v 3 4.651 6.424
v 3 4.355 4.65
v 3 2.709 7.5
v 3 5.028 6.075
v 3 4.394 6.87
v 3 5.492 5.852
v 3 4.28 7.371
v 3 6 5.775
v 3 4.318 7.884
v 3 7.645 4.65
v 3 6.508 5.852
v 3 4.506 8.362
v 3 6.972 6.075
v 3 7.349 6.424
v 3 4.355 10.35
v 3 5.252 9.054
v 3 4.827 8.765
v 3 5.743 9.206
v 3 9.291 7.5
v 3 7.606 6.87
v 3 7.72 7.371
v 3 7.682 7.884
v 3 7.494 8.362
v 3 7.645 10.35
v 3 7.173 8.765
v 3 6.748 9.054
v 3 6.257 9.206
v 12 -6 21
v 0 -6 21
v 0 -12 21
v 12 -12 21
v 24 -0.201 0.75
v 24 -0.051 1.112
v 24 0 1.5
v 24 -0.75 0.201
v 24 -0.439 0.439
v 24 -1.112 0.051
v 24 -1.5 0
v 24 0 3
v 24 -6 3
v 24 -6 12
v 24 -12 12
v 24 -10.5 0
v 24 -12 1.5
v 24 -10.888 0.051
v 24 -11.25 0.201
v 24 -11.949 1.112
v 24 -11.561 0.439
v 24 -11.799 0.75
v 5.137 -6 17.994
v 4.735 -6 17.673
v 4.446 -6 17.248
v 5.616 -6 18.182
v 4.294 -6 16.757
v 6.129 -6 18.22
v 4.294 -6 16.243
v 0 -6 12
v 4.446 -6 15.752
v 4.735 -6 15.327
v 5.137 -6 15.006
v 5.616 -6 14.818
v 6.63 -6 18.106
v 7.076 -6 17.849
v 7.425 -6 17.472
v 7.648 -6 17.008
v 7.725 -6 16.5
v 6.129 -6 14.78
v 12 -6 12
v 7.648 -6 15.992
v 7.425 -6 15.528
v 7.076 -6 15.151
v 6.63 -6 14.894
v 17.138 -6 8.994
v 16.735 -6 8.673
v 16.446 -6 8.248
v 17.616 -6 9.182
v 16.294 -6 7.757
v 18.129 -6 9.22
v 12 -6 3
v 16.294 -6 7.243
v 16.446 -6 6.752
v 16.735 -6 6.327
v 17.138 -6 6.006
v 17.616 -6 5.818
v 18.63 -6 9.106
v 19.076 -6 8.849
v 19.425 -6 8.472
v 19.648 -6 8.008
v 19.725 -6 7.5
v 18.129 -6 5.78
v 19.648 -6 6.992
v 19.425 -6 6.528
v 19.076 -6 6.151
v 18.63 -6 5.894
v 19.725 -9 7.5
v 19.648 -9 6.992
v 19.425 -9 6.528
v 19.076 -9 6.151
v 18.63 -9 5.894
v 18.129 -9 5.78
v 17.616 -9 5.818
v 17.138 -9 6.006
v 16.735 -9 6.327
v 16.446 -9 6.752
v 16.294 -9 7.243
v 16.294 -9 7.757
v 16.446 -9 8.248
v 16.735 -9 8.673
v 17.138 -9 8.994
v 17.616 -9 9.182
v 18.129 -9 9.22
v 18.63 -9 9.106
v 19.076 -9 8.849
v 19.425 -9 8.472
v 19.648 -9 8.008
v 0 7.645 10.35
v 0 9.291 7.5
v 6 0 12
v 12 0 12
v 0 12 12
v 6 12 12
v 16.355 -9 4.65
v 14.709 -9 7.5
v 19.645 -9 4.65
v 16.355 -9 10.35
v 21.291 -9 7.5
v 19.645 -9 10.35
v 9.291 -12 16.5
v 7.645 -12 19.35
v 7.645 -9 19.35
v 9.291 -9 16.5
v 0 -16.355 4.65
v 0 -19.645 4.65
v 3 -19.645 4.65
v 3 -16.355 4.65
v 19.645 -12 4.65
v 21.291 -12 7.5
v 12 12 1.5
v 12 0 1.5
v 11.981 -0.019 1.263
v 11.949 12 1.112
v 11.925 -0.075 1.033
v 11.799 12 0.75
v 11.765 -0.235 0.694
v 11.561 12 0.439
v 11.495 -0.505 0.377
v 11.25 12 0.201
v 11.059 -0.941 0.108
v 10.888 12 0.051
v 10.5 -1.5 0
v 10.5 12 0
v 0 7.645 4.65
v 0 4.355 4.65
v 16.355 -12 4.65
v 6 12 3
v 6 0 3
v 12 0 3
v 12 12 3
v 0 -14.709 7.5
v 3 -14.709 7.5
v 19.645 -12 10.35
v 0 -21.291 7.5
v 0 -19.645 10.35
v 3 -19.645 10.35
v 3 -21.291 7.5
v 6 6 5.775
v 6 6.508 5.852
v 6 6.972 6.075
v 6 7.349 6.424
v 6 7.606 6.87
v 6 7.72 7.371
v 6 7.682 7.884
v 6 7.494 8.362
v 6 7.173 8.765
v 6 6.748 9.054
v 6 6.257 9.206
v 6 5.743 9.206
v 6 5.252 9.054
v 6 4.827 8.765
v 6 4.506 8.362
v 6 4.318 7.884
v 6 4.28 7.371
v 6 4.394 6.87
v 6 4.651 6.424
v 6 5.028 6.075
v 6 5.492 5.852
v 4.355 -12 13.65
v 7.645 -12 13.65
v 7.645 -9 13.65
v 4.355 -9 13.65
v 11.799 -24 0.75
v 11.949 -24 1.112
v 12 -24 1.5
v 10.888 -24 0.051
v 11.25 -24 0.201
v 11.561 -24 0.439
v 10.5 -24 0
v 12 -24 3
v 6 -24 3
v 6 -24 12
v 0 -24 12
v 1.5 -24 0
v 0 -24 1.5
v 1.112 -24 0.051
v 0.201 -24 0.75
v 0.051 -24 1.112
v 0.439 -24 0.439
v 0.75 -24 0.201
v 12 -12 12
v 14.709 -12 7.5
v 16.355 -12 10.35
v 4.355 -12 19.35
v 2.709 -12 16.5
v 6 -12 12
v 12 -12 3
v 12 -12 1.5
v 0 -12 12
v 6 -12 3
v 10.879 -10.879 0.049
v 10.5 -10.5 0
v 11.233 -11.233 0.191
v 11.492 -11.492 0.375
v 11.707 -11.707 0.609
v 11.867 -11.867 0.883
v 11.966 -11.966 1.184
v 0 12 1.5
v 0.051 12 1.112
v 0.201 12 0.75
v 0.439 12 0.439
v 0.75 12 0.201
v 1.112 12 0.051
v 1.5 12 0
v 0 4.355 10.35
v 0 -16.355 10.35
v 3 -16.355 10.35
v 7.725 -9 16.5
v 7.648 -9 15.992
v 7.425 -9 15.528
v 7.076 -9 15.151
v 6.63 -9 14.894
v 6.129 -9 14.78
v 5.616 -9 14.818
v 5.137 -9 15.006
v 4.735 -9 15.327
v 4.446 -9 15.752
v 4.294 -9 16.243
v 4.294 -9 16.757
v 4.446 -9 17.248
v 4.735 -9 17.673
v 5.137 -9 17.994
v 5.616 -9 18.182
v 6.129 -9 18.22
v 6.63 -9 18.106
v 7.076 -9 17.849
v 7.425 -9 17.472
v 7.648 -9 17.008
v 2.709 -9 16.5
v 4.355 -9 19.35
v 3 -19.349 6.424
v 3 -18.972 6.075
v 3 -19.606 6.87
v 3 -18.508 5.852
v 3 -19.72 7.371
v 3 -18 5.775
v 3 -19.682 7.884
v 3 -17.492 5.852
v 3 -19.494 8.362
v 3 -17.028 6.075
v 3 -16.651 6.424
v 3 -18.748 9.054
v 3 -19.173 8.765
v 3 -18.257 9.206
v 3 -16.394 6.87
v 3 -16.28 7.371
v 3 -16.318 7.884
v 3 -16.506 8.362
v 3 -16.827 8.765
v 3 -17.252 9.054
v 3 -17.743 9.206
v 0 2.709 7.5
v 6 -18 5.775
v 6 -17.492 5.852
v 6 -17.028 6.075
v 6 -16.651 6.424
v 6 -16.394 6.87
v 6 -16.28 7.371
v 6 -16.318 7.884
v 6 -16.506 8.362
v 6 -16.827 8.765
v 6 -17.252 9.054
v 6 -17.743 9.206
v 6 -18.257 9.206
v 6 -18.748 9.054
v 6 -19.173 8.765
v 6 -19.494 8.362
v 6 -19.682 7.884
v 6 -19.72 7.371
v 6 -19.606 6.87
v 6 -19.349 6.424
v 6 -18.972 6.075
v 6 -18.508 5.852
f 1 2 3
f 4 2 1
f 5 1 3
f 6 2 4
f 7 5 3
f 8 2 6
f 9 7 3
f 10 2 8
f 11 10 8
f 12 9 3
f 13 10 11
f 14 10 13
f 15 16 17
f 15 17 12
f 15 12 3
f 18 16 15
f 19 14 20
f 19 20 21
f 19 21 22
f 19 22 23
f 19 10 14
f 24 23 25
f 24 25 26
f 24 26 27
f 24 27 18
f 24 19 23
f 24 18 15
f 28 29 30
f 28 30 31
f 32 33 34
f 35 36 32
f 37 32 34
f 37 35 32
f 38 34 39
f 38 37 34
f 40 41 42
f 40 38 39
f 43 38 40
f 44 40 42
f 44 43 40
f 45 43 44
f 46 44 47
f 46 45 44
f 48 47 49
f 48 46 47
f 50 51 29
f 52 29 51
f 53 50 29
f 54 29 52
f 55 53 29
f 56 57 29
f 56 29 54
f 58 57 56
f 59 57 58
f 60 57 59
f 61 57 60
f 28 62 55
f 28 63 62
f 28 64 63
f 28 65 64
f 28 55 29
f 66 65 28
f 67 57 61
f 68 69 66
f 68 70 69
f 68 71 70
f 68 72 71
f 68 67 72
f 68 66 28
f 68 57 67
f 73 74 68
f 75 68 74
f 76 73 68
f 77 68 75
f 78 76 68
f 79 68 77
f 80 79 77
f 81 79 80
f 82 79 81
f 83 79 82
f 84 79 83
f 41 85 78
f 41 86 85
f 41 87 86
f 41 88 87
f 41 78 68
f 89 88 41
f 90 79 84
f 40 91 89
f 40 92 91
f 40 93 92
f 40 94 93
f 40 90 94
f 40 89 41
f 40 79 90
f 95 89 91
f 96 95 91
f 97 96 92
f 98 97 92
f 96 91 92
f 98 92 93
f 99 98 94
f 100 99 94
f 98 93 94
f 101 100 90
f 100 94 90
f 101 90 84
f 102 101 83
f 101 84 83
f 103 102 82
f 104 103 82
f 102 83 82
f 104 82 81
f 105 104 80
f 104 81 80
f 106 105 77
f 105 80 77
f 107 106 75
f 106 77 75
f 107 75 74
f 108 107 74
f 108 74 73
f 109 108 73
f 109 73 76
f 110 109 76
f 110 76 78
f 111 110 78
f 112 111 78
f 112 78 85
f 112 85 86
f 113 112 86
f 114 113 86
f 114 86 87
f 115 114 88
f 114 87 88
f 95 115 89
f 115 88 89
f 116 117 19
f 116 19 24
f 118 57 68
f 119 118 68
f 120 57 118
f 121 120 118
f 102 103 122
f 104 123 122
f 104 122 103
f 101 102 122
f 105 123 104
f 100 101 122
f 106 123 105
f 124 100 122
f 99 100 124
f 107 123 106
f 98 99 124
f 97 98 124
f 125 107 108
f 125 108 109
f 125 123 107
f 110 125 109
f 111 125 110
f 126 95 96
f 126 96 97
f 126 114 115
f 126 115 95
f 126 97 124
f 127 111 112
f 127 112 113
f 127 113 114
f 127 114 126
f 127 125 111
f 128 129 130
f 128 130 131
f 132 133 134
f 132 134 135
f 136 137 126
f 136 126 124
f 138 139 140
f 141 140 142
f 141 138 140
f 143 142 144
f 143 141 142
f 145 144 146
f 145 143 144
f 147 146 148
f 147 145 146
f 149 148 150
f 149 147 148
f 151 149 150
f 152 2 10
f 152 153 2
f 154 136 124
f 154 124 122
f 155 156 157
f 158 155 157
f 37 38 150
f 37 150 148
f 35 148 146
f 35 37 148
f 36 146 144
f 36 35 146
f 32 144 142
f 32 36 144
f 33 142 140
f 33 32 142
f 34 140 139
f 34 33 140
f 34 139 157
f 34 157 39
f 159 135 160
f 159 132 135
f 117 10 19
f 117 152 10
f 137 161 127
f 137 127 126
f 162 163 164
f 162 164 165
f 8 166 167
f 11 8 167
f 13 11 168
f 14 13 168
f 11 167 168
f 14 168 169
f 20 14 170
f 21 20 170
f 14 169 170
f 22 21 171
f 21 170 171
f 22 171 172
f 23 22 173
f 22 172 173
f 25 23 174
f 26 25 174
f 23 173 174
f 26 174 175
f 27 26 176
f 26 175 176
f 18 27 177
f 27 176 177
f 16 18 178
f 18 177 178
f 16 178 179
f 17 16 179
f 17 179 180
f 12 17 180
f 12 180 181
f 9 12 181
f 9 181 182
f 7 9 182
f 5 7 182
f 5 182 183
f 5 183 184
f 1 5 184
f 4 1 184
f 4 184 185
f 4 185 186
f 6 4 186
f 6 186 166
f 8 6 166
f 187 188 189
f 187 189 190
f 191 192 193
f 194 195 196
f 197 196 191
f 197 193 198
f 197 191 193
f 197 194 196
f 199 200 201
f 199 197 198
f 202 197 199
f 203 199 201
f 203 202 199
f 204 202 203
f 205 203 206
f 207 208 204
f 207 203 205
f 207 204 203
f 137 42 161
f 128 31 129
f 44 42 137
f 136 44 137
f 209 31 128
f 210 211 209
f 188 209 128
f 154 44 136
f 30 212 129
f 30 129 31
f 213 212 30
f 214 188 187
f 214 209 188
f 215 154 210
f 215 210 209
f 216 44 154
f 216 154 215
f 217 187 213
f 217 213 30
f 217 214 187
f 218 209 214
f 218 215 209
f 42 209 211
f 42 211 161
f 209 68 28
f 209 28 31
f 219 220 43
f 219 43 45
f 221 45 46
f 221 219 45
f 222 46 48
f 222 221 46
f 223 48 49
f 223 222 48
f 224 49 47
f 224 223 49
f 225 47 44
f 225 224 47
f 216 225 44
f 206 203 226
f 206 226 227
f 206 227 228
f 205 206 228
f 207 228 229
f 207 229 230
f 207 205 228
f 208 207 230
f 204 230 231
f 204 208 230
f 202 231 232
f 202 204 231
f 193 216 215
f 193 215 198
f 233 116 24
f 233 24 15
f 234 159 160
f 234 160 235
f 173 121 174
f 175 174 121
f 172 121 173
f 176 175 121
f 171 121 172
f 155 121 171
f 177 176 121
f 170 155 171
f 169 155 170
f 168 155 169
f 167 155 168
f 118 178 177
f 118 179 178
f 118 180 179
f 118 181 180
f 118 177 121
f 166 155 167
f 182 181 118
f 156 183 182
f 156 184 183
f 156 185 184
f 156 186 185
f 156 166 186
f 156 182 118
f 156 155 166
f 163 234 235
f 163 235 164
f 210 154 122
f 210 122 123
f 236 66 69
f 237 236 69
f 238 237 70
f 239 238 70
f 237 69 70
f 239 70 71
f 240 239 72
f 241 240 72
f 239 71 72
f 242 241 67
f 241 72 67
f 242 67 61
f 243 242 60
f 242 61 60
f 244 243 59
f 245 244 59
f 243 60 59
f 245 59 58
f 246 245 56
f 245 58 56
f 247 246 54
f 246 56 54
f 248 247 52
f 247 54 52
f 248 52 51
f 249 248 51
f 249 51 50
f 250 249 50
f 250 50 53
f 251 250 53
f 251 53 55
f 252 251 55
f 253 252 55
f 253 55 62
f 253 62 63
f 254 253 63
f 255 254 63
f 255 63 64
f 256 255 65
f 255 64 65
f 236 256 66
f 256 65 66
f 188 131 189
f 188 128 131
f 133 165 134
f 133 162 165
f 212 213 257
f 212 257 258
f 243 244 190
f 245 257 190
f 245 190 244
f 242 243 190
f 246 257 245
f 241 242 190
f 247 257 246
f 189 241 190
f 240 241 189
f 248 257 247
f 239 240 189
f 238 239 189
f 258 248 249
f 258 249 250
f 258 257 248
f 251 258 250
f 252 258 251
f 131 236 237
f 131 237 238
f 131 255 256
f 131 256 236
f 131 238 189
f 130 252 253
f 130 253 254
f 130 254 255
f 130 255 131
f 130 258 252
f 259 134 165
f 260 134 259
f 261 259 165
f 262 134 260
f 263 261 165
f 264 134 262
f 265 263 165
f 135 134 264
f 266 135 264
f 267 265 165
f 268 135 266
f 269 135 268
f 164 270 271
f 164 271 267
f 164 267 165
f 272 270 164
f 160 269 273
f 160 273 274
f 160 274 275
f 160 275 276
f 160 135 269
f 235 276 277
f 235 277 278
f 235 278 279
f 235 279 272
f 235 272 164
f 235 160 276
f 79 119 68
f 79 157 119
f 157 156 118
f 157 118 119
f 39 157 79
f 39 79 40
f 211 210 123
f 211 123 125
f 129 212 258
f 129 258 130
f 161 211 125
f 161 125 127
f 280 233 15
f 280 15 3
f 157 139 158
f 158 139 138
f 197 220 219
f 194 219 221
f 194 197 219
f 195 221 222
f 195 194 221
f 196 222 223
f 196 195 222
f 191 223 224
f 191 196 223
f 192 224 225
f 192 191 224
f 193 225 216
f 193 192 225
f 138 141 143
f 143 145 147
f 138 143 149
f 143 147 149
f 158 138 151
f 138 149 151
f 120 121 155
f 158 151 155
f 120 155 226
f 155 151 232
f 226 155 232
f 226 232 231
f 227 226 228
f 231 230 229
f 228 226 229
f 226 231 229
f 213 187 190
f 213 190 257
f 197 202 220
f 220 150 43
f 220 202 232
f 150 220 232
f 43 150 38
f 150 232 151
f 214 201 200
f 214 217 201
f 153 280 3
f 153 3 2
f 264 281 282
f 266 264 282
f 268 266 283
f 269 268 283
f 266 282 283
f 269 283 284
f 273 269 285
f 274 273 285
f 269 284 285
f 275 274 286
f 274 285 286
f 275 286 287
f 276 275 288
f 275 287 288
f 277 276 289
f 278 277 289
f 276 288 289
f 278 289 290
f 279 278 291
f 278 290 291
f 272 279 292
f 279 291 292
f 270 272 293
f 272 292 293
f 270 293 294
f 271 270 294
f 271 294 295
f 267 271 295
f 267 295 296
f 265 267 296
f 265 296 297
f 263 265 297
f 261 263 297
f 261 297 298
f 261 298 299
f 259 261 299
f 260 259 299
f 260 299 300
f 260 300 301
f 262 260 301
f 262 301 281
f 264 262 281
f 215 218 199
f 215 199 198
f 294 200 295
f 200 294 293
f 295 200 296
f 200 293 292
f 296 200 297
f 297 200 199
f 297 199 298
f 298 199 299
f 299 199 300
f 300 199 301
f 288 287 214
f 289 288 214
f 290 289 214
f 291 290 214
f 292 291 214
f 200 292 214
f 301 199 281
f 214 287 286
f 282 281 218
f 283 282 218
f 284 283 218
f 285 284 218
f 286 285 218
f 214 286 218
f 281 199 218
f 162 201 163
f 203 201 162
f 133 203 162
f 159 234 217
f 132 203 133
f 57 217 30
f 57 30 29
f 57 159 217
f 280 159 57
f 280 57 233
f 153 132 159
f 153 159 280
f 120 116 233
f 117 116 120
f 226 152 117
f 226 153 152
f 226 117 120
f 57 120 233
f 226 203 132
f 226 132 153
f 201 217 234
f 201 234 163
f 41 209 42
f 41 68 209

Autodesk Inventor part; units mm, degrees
ref_plane "YZ Plane" through (0, 0, 0) normal (1, 0, 0) x (0, 1, 0)
ref_plane "XZ Plane" through (0, 0, 0) normal (0, 1, 0) x (-1, 0, 0)
ref_plane "XY Plane" through (0, 0, 0) normal (0, 0, 1) x (1, 0, 0)
sketch "Sketch1" plane through (0, 0, 0) normal (0, 0, 1) x (1, 0, 0)
  line L0 (0, 0) -> (12, 0)
  line L1 (12, 0) -> (12, 12)
  line L2 (12, 12) -> (0, 12)
  line L3 (0, 12) -> (0, 0)
  line L4 (12, 0) -> (0, 0)
  line L5 (0, 0) -> (0, -12)
  line L6 (0, -12) -> (12, -12)
  line L7 (12, -12) -> (12, 0)
  line L8 (12, 0) -> (24, 0)
  line L9 (24, 0) -> (24, -12)
  line L10 (24, -12) -> (12, -12)
  line L11 (12, -12) -> (12, 0)
  line L12 (0, -12) -> (-12, -12)
  line L13 (-12, -12) -> (-12, 0)
  line L14 (-12, 0) -> (0, 0)
  line L15 (0, 0) -> (0, -12)
  line L16 (0, -12) -> (12, -12)
  line L17 (12, -12) -> (12, -24)
  line L18 (12, -24) -> (0, -24)
  line L19 (0, -24) -> (0, -12)
  dimension "d0" = 12
  dimension "d1" = 12
  dimension "d2" = 12
  dimension "d3" = 12
  dimension "d4" = 12
  dimension "d5" = 12
  dimension "d6" = 12
  dimension "d7" = 12
  dimension "d8" = 12
  dimension "d9" = 12
extrude "Extrusion1" add sketch "Sketch1" along normal blind 3
sketch "Sketch2" plane through (0, 0, 3) normal (0, 0, 1) x (1, 0, 0)
  line L0 (-12, 0) -> (-12, -12) projected
  line L1 (-12, -12) -> (-12, -6)
  line L2 (-12, -6) -> (0, -6)
  line L3 (-12, -12) -> (0, -12) projected
  line L4 (0, -6) -> (0, -12)
  line L5 (0, -12) -> (-12, -12)
  line L6 (12, -24) -> (12, -12) projected
  line L7 (12, -12) -> (12, -6)
  line L8 (12, -6) -> (24, -6)
  line L9 (24, -12) -> (24, 0) projected
  line L10 (12, -12) -> (24, -12) projected
  line L11 (24, -6) -> (24, -12)
  line L12 (24, -12) -> (12, -12)
  line L13 (0, 0) -> (0, -6)
  line L14 (12, 0) -> (12, 12) projected
  line L15 (0, 0) -> (12, 0)
  line L16 (12, 0) -> (12, -6)
  line L17 (12, -12) -> (0, -12)
  line L18 (0, 12) -> (0, 0) projected
  line L19 (0, 0) -> (0, 12)
  line L20 (0, 12) -> (6, 12)
  line L21 (12, 12) -> (0, 12) projected
  line L22 (6, 12) -> (6, 0)
  line L23 (6, 0) -> (0, 0)
  line L24 (0, -12) -> (0, -24) projected
  line L25 (0, -12) -> (0, -24)
  line L26 (0, -24) -> (6, -24)
  line L27 (0, -24) -> (12, -24) projected
  line L28 (6, -24) -> (6, -12)
  line L29 (6, -12) -> (0, -12)
  dimension "d12" = 6
  dimension "d13" = 12
extrude "Extrusion2" add sketch "Sketch2" along normal blind 9 contours L2 L4 L3 L0 | L13 L15 L16 L7 L17 L4 | L17 L28 L26 L24 | L18 L20 L22 L15 | L7 L8 L9 L10
sketch "Sketch3" plane through (0, 0, 12) normal (0, 0, 1) x (1, 0, 0)
  line L0 (0, -6) -> (12, -6)
  line L1 (12, -12) -> (6, -12) projected
  line L2 (12, -6) -> (12, -12)
  line L3 (0, -12) -> (0, -24) projected
  line L4 (12, -12) -> (0, -12)
  line L5 (0, -12) -> (0, -6)
  point P0 (0, 0)
extrude "Extrusion3" add sketch "Sketch3" along normal blind 9
sketch "Sketch4" plane through (6, -12, 3) normal (0, -1, 0) x (1, 0, 0)
  point P0 (-6, -3)
sketch "Sketch5" plane through (-12, -6, 3) normal (0, 1, 0) x (1, 0, 0)
  circle A0 centre (6, -4.5) radius 1.725
  line L0 (0, 0) -> (0, -9) projected
  line L1 (12, -9) -> (0, -9) projected
  circle A1 centre (18, -13.5) radius 1.725
  line L2 (24, -18) -> (12, -18) projected
  line L3 (24, -9) -> (24, -18) projected
  circle A2 centre (30, -4.5) radius 1.725
  line L4 (36, 0) -> (36, -9) projected
  line L5 (36, -9) -> (24, -9) projected
  point P0 (12, 3)
  dimension "d19" = 3.45
  dimension "d20" = 6
  dimension "d21" = 4.5
  dimension "d22" = 3.45
  dimension "d23" = 4.5
  dimension "d24" = 6
  dimension "d25" = 3.45
  dimension "d26" = 6
  dimension "d27" = 4.5
extrude "Extrusion4" cut sketch "Sketch5" against normal blind 3
sketch "Sketch6" plane through (6, -12, 3) normal (0, -1, 0) x (1, 0, 0)
  circle A0 centre (-12, 4.5) radius 1.725 projected
  line L0 (-10.3546, 7.35) -> (-8.7091, 4.5)
  line L1 (-8.7091, 4.5) -> (-10.3546, 1.65)
  line L2 (-10.3546, 1.65) -> (-13.6454, 1.65)
  line L3 (-13.6454, 1.65) -> (-15.2909, 4.5)
  line L4 (-15.2909, 4.5) -> (-13.6454, 7.35)
  line L5 (-13.6454, 7.35) -> (-10.3546, 7.35)
  circle A1 centre (12, 4.5) radius 1.725 projected
  line L6 (13.6454, 7.35) -> (15.2909, 4.5)
  line L7 (15.2909, 4.5) -> (13.6454, 1.65)
  line L8 (13.6454, 1.65) -> (10.3546, 1.65)
  line L9 (10.3546, 1.65) -> (8.7091, 4.5)
  line L10 (8.7091, 4.5) -> (10.3546, 7.35)
  line L11 (10.3546, 7.35) -> (13.6454, 7.35)
  circle A2 centre (0, 13.5) radius 1.725 projected
  line L12 (1.6454, 16.35) -> (3.2909, 13.5)
  line L13 (3.2909, 13.5) -> (1.6454, 10.65)
  line L14 (1.6454, 10.65) -> (-1.6454, 10.65)
  line L15 (-1.6454, 10.65) -> (-3.2909, 13.5)
  line L16 (-3.2909, 13.5) -> (-1.6454, 16.35)
  line L17 (-1.6454, 16.35) -> (1.6454, 16.35)
  point P0 (-6, -3)
  dimension "d30" = 2.85
  dimension "d31" = 2.85
  dimension "d32" = 2.85
extrude "Extrusion5" cut sketch "Sketch6" against normal blind 3 contours A0 | L0 L1 L2 L3 L4 L5 | A1 | L6 L7 L8 L9 L10 L11 | A2 | L12 L13 L14 L15 L16 L17
sketch "Sketch7" plane through (6, 0, 3) normal (1, 0, 0) x (0, 0, -1)
  circle A0 centre (-4.5, 6) radius 1.725
  circle A1 centre (-4.5, -18) radius 1.725
  line L0 (-9, 0) -> (-9, 12) projected
  line L1 (-9, -24) -> (-9, -12) projected
  line L2 (0, -24) -> (-9, -24) projected
  line L3 (0, 12) -> (-9, 12) projected
  point P0 (3, 0)
  dimension "d35" = 3.45
  dimension "d36" = 3.45
  dimension "d37" = 4.5
  dimension "d38" = 4.5
  dimension "d39" = 6
  dimension "d40" = 6
extrude "Extrusion6" cut sketch "Sketch7" against normal blind 3
sketch "Sketch8" plane through (0, -6, 3) normal (-1, 0, 0) x (0, 0, 1)
  circle A0 centre (4.5, 12) radius 1.725 projected
  line L0 (1.65, 13.6454) -> (4.5, 15.2909)
  line L1 (4.5, 15.2909) -> (7.35, 13.6454)
  line L2 (7.35, 13.6454) -> (7.35, 10.3546)
  line L3 (7.35, 10.3546) -> (4.5, 8.7091)
  line L4 (4.5, 8.7091) -> (1.65, 10.3546)
  line L5 (1.65, 10.3546) -> (1.65, 13.6454)
  circle A1 centre (4.5, -12) radius 1.725 projected
  line L6 (1.65, -10.3546) -> (4.5, -8.7091)
  line L7 (4.5, -8.7091) -> (7.35, -10.3546)
  line L8 (7.35, -10.3546) -> (7.35, -13.6454)
  line L9 (7.35, -13.6454) -> (4.5, -15.2909)
  line L10 (4.5, -15.2909) -> (1.65, -13.6454)
  line L11 (1.65, -13.6454) -> (1.65, -10.3546)
  point P0 (-3, 6)
  dimension "d43" = 2.85
  dimension "d44" = 2.85
extrude "Extrusion7" cut sketch "Sketch8" against normal blind 3 contours A0 | L0 L1 L2 L3 L4 L5 | A1 | L6 L7 L8 L9 L10 L11
sketch "Sketch9" plane through (0, 0, 0) normal (0, 0, -1) x (-1, 0, 0)
  line L0 (0, 0) -> (12, 0) projected
  line L1 (12, 0) -> (12, -12) projected
  line L2 (0, 0) -> (12, 0)
  line L3 (12, 0) -> (12, -12)
  line L4 (12, -12) -> (0, -12)
  line L5 (0, -12) -> (0, 0)
extrude "Extrusion8" cut sketch "Sketch9" against normal through all
fillet "Fillet2" radius 1.5 5 edges at (18, 0, 0) (12, 6, 0) (18, -12, 0) (12, -18, 0) (0, -6, 0)
properties part number "threewayNSW"
